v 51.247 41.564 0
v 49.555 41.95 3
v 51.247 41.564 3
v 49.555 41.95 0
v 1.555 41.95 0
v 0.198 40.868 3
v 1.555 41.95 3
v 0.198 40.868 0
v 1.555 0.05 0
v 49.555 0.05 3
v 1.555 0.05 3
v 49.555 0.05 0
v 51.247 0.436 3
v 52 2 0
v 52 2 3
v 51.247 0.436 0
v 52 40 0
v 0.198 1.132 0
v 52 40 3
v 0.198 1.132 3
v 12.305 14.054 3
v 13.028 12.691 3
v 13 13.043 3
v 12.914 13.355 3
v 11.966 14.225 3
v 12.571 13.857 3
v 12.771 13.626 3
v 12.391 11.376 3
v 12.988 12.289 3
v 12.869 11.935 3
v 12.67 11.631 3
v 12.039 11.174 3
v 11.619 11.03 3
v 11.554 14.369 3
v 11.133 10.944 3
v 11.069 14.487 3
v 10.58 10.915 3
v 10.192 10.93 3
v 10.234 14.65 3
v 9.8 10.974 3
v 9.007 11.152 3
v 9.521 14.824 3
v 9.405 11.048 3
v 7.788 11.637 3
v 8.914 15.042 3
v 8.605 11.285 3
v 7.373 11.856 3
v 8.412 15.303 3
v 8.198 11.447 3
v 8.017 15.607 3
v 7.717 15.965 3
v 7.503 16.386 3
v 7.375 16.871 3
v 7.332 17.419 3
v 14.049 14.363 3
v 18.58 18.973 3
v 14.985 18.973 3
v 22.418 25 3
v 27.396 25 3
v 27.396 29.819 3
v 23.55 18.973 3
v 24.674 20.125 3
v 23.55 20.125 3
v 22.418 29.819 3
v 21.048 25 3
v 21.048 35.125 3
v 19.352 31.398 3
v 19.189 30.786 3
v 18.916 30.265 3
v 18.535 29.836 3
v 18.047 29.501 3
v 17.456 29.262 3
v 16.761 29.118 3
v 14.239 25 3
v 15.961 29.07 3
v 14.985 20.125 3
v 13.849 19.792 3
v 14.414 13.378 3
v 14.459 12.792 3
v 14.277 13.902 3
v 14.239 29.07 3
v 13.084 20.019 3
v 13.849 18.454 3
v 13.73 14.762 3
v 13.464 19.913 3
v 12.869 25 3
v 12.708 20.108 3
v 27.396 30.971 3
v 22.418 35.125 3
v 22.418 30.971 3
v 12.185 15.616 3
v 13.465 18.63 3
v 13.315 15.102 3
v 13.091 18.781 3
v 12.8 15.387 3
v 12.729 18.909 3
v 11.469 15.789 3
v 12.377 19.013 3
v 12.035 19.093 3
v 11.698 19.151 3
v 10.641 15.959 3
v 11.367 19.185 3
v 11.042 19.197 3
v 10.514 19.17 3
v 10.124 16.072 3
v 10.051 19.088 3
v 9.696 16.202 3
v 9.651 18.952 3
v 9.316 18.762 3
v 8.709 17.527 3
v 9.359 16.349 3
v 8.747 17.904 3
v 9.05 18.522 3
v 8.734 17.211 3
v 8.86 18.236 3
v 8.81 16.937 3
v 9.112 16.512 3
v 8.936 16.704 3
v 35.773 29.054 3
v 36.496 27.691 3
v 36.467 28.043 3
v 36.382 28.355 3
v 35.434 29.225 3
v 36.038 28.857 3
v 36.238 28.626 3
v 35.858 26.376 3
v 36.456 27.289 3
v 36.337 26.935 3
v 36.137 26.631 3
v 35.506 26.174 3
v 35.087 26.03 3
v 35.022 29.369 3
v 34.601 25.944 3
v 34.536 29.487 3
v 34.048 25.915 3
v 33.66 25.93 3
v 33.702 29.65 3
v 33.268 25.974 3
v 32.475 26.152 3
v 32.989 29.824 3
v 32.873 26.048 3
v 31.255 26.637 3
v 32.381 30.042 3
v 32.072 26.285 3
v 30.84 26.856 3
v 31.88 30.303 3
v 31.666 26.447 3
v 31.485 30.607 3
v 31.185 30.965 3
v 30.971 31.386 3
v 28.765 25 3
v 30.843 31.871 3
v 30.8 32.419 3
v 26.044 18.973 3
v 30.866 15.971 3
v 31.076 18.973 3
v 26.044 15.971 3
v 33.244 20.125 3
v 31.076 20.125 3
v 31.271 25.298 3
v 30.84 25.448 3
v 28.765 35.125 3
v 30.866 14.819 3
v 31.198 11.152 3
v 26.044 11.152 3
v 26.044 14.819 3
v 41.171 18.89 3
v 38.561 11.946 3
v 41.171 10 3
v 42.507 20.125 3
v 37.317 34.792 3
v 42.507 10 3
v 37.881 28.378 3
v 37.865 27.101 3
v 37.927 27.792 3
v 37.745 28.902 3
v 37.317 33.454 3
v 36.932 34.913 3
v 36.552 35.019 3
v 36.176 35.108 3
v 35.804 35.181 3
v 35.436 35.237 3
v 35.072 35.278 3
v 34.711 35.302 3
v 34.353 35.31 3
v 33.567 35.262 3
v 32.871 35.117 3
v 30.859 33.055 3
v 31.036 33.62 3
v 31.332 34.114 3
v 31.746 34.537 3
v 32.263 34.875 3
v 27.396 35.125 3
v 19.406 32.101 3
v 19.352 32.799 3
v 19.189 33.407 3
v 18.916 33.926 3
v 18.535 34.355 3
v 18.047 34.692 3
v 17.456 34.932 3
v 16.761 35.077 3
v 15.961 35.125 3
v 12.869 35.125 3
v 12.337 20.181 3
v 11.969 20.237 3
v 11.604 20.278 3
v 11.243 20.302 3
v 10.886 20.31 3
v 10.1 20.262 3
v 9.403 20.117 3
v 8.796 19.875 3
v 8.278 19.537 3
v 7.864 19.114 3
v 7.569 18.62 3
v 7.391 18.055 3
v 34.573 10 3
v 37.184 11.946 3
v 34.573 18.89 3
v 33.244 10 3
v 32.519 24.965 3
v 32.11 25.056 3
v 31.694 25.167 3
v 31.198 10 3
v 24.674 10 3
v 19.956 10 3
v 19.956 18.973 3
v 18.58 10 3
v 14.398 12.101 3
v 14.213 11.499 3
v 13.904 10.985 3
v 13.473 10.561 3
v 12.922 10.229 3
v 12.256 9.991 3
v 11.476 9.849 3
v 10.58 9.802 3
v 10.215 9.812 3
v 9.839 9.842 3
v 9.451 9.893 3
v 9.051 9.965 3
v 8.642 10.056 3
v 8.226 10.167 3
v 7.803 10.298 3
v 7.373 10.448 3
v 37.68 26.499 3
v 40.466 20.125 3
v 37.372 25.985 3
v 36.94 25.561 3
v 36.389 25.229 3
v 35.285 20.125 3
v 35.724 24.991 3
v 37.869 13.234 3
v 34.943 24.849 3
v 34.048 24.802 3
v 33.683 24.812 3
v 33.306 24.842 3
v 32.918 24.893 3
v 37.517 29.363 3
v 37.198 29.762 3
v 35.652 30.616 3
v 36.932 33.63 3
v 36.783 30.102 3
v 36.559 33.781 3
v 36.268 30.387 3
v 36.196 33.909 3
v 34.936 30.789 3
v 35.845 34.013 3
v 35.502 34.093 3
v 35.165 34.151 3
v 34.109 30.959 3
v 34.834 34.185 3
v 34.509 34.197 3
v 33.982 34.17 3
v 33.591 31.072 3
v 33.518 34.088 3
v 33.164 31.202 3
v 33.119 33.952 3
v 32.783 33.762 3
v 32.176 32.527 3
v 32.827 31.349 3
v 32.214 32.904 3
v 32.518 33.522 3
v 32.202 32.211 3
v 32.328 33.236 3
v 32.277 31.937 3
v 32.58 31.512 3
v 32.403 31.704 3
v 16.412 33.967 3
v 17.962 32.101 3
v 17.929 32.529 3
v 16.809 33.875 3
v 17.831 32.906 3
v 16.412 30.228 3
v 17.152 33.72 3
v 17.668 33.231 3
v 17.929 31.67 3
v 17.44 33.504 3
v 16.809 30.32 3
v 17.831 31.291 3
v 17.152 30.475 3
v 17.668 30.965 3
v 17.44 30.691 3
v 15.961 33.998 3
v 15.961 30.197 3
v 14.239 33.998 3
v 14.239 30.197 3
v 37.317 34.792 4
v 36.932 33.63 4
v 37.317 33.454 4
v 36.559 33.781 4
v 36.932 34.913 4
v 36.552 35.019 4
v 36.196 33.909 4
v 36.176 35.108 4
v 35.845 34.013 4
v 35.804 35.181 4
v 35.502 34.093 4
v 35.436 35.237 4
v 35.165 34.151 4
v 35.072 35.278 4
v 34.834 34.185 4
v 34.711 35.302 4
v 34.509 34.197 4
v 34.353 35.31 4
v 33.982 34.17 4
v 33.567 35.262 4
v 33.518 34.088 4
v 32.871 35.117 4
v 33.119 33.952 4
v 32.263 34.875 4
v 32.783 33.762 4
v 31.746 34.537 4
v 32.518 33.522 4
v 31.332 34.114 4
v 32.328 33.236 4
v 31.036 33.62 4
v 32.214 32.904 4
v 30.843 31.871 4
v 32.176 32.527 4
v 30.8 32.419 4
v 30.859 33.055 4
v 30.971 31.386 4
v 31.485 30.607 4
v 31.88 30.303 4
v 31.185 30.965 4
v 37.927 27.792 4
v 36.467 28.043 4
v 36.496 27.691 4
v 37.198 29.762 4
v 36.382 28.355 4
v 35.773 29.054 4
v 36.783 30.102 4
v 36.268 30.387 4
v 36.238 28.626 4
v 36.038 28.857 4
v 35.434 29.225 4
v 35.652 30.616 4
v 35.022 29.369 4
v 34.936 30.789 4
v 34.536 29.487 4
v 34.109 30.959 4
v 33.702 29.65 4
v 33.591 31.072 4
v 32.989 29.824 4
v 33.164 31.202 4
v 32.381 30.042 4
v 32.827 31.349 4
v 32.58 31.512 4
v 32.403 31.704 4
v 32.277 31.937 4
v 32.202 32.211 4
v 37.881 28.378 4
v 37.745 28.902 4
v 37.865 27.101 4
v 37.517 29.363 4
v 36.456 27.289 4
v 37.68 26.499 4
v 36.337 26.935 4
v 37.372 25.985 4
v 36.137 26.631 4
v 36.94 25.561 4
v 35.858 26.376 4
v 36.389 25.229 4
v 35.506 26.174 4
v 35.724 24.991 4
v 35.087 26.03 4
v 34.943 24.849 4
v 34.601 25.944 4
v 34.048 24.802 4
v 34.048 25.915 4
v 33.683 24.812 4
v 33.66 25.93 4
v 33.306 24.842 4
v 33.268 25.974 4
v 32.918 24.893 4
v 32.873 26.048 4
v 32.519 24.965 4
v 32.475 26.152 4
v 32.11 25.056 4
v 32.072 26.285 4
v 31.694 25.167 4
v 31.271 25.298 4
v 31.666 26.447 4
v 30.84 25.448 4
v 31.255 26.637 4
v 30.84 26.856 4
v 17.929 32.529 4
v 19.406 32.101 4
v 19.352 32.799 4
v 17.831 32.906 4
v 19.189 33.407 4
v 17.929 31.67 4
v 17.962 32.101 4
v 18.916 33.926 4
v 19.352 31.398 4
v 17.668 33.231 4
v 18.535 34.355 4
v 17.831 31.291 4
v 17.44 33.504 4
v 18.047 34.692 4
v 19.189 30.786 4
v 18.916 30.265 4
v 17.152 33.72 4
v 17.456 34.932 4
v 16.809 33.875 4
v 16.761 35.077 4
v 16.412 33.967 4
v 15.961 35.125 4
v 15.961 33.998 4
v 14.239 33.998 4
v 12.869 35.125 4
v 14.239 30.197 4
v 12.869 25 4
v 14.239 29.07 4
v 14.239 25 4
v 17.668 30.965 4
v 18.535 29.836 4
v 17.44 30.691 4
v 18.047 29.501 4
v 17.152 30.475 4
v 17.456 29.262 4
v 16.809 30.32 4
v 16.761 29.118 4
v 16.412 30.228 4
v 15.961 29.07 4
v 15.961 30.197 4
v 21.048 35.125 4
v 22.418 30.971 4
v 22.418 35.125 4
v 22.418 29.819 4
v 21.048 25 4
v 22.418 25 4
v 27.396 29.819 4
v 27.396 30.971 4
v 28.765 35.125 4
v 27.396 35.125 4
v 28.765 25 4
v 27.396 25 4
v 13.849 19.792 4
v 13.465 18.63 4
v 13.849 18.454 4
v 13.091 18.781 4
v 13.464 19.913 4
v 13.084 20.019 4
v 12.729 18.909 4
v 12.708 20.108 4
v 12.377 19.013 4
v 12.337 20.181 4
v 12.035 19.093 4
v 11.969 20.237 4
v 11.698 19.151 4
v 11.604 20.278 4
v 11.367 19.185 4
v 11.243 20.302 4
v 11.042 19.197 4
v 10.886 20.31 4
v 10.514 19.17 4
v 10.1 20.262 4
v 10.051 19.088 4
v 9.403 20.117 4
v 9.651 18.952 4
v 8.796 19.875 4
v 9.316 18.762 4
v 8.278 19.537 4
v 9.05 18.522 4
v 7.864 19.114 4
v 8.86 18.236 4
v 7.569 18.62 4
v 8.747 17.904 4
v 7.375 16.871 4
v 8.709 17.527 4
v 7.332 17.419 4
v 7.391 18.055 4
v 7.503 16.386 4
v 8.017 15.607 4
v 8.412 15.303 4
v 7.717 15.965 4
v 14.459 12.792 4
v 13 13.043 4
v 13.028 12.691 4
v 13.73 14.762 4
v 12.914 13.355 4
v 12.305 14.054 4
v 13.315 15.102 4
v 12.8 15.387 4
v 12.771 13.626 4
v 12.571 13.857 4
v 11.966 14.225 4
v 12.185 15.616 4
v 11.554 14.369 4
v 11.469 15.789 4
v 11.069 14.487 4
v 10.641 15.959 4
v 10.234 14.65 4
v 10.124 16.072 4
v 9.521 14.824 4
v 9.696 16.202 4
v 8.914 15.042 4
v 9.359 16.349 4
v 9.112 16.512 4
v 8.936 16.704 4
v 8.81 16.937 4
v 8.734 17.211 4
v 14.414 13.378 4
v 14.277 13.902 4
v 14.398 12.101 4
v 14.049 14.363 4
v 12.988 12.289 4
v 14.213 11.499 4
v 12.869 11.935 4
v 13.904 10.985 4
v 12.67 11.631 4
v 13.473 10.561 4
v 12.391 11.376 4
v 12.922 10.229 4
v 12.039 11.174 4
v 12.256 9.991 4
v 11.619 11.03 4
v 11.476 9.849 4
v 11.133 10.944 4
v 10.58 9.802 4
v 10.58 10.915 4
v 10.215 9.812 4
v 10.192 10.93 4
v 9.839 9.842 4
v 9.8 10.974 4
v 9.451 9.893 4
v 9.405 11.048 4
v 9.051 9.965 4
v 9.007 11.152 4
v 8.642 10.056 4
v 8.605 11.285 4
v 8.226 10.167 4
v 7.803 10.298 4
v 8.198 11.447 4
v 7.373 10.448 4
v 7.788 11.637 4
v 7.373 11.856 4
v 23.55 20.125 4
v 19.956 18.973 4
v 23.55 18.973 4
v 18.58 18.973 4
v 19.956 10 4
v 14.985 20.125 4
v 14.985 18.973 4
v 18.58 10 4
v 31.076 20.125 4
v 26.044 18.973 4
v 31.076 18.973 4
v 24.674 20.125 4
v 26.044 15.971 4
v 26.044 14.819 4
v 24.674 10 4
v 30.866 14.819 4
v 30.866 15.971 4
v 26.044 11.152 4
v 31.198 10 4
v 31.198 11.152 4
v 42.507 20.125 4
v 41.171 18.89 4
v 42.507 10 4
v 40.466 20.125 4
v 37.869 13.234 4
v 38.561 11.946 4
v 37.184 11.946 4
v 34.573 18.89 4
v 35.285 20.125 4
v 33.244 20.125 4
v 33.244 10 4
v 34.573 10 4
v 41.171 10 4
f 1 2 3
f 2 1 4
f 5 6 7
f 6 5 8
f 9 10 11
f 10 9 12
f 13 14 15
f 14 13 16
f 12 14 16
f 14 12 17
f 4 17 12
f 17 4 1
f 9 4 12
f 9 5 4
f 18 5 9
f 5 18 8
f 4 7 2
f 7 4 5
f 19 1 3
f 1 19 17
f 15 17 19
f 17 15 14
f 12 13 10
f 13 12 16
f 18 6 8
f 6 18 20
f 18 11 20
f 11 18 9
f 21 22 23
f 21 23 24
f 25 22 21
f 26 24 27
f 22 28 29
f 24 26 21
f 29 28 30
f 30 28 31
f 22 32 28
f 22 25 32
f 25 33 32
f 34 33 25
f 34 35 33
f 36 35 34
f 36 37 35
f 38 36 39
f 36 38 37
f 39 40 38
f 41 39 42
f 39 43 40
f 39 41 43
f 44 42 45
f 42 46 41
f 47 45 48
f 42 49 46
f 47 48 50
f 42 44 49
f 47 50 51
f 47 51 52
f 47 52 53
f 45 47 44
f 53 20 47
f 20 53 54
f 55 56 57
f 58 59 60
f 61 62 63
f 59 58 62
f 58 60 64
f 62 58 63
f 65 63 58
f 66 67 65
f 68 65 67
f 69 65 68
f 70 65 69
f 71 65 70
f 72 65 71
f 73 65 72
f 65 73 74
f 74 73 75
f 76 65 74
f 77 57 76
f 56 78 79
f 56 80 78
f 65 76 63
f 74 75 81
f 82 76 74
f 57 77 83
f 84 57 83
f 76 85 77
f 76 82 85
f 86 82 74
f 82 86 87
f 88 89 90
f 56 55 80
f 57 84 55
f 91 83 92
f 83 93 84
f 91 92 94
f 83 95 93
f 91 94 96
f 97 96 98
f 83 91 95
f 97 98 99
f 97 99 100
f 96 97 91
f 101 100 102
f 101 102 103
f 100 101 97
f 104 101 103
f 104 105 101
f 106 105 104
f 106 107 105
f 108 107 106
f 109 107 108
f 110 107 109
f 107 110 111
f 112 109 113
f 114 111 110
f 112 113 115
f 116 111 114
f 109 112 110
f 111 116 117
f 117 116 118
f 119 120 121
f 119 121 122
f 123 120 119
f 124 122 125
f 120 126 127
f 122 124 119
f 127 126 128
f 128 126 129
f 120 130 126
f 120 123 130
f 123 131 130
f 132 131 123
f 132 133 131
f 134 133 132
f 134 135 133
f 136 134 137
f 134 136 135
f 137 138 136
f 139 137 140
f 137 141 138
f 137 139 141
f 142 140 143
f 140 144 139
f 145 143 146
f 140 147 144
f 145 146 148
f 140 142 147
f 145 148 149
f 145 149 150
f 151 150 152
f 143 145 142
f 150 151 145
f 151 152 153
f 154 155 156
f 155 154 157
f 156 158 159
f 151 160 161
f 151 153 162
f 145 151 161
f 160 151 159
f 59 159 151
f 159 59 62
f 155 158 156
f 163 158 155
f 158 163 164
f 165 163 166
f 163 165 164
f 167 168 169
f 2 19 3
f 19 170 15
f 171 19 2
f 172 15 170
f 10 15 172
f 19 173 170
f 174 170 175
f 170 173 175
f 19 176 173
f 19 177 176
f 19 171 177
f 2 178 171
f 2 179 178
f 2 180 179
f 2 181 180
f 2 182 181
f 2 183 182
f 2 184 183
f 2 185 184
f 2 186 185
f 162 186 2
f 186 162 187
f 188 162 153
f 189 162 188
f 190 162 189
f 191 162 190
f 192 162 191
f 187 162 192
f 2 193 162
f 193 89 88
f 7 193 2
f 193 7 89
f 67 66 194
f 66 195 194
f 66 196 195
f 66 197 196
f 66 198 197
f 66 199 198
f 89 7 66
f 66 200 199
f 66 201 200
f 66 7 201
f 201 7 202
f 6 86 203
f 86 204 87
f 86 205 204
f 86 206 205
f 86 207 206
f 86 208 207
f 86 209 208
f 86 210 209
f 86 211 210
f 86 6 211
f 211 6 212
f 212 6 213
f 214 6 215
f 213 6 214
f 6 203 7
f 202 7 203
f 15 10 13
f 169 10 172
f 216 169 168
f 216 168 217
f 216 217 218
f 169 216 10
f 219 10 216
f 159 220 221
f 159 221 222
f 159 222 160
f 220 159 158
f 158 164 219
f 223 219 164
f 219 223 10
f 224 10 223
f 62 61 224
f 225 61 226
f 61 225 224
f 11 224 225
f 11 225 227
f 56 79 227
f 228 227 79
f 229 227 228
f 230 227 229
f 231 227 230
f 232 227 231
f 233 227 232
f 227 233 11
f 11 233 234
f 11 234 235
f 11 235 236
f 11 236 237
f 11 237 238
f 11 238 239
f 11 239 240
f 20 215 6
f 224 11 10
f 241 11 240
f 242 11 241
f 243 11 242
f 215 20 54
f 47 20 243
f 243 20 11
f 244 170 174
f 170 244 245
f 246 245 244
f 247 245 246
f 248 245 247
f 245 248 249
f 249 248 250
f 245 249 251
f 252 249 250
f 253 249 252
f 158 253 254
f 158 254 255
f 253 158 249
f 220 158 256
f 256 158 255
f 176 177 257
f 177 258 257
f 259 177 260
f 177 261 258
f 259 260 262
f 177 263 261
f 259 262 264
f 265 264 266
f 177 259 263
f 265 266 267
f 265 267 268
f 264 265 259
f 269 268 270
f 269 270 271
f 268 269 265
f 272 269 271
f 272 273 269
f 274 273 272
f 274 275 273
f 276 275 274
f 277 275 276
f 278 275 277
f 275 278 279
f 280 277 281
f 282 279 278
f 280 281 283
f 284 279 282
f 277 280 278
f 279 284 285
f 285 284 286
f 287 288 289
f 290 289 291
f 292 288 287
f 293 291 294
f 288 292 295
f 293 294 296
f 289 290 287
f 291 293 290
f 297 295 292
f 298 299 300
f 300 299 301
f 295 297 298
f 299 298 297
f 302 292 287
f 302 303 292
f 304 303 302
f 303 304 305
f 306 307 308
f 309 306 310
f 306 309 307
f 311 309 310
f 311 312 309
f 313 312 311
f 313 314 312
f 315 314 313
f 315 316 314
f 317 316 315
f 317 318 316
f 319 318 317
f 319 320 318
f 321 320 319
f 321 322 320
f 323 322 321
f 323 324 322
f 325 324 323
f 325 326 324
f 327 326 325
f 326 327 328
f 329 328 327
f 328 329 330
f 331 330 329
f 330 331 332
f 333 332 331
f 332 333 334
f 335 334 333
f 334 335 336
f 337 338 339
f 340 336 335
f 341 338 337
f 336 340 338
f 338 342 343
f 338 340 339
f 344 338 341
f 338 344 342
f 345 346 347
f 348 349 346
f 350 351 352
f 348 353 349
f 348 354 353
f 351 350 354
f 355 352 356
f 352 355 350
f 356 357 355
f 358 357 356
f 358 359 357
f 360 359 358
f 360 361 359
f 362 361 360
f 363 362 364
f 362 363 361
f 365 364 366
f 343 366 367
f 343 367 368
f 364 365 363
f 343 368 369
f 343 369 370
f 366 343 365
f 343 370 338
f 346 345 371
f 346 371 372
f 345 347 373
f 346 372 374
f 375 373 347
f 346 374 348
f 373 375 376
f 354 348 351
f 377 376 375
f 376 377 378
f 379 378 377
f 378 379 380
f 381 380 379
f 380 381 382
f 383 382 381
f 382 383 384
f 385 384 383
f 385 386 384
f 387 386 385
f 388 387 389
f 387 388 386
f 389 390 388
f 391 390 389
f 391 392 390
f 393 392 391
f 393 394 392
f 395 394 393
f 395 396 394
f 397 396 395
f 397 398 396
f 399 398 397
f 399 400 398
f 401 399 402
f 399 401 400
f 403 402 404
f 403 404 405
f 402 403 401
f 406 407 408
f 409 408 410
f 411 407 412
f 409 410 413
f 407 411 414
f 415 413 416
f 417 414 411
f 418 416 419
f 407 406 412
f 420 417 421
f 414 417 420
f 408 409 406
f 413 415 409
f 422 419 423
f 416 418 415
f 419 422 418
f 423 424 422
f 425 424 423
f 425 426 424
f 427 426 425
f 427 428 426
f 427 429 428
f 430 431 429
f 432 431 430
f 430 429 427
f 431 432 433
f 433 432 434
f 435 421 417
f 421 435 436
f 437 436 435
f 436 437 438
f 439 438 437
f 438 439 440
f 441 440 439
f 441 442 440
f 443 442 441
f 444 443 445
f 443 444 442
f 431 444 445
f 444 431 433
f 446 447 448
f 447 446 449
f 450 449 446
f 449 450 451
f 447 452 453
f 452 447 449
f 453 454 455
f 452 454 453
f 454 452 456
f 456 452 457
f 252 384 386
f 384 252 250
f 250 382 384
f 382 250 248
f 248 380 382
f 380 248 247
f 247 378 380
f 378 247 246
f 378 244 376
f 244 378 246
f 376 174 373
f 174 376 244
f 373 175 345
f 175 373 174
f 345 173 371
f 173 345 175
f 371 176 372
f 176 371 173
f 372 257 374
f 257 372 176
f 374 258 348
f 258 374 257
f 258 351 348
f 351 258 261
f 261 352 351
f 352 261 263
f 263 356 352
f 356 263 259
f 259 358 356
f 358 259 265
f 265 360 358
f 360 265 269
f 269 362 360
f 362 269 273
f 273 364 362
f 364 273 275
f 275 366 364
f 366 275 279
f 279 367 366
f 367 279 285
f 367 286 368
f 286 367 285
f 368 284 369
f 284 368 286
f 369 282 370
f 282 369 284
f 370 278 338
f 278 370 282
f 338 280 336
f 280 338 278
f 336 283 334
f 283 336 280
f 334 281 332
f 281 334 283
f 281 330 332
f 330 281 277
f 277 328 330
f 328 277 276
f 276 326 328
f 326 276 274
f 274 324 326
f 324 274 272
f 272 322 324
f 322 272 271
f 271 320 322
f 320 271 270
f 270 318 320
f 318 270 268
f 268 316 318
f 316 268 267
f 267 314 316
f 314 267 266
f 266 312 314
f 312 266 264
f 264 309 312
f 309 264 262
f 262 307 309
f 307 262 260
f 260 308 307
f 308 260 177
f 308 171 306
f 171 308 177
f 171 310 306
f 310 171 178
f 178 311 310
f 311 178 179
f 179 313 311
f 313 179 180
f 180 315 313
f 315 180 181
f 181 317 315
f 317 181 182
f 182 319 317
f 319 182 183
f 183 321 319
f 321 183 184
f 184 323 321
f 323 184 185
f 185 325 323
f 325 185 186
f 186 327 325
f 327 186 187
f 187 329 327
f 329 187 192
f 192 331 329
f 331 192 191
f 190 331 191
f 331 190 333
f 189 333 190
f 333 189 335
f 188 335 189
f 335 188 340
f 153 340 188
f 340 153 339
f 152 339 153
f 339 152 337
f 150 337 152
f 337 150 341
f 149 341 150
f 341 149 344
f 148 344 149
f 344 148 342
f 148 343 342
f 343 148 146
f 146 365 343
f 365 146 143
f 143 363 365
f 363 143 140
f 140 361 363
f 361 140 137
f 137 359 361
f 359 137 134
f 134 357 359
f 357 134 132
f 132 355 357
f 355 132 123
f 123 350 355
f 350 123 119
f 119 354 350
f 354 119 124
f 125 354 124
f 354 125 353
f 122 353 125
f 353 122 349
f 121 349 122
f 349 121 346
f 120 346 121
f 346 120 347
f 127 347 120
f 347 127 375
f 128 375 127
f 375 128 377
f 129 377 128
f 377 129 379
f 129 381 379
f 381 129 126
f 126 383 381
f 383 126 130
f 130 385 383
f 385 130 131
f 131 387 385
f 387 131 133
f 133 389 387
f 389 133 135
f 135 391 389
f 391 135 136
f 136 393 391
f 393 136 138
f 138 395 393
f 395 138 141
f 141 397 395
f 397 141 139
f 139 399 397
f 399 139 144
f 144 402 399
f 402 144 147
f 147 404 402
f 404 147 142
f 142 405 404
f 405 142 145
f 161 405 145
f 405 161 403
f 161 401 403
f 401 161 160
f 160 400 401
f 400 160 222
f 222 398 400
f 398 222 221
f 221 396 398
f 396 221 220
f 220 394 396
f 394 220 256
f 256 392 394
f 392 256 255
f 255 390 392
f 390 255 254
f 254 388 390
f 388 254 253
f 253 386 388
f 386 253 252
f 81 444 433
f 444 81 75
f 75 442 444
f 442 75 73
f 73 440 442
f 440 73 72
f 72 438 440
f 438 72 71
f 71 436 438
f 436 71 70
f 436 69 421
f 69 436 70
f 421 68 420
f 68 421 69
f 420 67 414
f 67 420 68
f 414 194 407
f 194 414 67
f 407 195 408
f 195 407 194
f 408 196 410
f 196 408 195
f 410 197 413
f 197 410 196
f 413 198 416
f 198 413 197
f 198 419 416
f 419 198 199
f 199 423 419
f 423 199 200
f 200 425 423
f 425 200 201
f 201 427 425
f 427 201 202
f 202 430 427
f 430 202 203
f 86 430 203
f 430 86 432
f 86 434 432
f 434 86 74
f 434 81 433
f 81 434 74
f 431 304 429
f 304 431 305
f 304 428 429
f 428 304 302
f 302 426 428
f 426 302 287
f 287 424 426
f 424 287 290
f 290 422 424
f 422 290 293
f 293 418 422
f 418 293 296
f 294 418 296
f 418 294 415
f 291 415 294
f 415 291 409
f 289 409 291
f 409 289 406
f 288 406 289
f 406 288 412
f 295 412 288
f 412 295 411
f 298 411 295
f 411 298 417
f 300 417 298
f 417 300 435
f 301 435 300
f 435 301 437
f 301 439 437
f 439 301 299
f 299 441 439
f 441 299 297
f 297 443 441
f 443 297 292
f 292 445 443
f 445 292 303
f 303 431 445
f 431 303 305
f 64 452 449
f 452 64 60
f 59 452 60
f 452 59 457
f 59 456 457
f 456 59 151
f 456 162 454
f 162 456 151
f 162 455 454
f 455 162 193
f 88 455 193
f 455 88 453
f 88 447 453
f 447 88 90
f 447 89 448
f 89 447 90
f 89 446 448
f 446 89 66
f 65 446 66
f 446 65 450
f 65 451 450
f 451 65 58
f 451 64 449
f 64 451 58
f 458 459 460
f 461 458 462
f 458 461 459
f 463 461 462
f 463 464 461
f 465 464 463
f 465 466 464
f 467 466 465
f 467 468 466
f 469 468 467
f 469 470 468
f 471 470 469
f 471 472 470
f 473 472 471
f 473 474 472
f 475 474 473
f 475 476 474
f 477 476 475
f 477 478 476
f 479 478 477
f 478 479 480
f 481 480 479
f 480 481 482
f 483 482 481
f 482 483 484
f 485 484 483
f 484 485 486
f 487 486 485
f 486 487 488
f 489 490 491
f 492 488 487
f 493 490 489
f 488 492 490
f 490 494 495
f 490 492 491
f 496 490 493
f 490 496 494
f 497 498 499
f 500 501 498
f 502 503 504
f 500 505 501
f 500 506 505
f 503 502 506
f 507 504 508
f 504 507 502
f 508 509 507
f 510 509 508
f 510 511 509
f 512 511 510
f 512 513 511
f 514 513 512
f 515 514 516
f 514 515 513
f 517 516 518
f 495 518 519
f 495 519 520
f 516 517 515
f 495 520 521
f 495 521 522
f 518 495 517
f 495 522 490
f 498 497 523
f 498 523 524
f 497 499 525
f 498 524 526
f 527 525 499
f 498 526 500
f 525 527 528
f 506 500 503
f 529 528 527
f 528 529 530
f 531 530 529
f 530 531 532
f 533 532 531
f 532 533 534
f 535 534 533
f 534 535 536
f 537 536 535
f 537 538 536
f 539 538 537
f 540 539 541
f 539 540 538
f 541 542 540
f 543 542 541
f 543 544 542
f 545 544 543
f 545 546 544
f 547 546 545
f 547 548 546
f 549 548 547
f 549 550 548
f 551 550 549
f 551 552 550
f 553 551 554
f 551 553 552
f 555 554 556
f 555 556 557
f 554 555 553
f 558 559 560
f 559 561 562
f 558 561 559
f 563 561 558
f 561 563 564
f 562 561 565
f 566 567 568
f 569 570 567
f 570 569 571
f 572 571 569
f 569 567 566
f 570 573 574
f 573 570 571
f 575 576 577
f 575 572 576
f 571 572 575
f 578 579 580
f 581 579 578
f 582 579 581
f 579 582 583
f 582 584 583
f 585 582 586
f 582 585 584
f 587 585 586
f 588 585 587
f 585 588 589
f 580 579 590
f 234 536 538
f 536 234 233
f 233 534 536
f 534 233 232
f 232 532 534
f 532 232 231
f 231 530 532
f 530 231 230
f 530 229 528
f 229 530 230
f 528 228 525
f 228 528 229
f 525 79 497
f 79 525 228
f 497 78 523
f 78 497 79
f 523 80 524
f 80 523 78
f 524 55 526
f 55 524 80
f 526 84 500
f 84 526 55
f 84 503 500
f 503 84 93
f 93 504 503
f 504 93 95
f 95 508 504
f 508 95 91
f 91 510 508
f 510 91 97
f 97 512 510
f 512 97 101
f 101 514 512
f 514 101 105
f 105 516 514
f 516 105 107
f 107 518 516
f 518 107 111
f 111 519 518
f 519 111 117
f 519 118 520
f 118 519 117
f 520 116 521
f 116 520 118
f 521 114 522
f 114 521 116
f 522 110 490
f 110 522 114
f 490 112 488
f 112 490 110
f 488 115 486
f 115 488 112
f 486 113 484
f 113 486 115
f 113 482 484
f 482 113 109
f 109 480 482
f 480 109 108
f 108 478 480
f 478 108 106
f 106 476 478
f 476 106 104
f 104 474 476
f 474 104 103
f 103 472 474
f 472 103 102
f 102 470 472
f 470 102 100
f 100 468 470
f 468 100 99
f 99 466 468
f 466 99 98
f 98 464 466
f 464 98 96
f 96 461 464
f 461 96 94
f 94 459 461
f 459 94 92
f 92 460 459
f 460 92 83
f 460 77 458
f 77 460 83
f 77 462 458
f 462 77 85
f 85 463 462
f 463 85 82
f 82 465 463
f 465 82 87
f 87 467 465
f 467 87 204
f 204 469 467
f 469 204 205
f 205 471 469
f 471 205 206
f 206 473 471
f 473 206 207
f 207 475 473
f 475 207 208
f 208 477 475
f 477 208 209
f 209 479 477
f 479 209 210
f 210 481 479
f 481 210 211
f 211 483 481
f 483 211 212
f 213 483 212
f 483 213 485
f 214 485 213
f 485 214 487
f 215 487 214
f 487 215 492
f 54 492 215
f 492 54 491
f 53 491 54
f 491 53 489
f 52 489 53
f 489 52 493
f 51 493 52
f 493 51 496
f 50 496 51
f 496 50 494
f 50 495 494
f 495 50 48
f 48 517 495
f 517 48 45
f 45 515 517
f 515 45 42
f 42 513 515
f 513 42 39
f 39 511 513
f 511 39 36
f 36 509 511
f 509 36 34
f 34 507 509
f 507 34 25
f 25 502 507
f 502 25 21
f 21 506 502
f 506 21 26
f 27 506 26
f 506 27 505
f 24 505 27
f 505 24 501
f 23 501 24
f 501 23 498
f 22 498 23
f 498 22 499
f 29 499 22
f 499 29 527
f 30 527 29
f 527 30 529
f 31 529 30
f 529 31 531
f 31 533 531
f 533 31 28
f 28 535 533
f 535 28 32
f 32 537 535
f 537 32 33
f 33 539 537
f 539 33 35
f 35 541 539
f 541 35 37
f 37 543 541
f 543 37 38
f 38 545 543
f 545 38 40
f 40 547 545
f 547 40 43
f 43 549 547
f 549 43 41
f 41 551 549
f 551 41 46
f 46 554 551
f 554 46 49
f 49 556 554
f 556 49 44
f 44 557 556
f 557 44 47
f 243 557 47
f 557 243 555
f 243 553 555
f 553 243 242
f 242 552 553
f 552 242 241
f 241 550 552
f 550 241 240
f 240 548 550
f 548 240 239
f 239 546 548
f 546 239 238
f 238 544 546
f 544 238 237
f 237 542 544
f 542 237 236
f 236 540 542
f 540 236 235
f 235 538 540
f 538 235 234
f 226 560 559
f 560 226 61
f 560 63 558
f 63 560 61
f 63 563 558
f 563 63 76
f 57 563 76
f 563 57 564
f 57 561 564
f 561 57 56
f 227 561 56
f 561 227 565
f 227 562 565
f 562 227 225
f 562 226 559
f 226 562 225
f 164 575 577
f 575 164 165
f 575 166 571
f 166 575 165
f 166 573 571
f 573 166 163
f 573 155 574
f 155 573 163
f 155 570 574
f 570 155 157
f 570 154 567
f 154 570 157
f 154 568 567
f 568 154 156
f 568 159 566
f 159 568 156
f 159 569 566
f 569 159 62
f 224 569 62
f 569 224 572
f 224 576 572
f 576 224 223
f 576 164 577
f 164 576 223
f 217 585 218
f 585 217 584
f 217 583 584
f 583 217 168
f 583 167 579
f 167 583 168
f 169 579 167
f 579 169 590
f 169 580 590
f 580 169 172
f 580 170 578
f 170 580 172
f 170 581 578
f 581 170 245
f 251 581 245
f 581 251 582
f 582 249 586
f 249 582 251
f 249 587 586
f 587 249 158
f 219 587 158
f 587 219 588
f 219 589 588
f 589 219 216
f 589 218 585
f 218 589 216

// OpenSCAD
translate([2,2,0])
minkowski()
{
    cube([48,38,2]);
    cylinder(r=2,h=1);
}
translate([25,25,2])linear_extrude(2)text("PHS", font="britannic bold", halign="center");
translate([25,10,2])linear_extrude(2)text("STEM", font="britannic bold", halign="center");
